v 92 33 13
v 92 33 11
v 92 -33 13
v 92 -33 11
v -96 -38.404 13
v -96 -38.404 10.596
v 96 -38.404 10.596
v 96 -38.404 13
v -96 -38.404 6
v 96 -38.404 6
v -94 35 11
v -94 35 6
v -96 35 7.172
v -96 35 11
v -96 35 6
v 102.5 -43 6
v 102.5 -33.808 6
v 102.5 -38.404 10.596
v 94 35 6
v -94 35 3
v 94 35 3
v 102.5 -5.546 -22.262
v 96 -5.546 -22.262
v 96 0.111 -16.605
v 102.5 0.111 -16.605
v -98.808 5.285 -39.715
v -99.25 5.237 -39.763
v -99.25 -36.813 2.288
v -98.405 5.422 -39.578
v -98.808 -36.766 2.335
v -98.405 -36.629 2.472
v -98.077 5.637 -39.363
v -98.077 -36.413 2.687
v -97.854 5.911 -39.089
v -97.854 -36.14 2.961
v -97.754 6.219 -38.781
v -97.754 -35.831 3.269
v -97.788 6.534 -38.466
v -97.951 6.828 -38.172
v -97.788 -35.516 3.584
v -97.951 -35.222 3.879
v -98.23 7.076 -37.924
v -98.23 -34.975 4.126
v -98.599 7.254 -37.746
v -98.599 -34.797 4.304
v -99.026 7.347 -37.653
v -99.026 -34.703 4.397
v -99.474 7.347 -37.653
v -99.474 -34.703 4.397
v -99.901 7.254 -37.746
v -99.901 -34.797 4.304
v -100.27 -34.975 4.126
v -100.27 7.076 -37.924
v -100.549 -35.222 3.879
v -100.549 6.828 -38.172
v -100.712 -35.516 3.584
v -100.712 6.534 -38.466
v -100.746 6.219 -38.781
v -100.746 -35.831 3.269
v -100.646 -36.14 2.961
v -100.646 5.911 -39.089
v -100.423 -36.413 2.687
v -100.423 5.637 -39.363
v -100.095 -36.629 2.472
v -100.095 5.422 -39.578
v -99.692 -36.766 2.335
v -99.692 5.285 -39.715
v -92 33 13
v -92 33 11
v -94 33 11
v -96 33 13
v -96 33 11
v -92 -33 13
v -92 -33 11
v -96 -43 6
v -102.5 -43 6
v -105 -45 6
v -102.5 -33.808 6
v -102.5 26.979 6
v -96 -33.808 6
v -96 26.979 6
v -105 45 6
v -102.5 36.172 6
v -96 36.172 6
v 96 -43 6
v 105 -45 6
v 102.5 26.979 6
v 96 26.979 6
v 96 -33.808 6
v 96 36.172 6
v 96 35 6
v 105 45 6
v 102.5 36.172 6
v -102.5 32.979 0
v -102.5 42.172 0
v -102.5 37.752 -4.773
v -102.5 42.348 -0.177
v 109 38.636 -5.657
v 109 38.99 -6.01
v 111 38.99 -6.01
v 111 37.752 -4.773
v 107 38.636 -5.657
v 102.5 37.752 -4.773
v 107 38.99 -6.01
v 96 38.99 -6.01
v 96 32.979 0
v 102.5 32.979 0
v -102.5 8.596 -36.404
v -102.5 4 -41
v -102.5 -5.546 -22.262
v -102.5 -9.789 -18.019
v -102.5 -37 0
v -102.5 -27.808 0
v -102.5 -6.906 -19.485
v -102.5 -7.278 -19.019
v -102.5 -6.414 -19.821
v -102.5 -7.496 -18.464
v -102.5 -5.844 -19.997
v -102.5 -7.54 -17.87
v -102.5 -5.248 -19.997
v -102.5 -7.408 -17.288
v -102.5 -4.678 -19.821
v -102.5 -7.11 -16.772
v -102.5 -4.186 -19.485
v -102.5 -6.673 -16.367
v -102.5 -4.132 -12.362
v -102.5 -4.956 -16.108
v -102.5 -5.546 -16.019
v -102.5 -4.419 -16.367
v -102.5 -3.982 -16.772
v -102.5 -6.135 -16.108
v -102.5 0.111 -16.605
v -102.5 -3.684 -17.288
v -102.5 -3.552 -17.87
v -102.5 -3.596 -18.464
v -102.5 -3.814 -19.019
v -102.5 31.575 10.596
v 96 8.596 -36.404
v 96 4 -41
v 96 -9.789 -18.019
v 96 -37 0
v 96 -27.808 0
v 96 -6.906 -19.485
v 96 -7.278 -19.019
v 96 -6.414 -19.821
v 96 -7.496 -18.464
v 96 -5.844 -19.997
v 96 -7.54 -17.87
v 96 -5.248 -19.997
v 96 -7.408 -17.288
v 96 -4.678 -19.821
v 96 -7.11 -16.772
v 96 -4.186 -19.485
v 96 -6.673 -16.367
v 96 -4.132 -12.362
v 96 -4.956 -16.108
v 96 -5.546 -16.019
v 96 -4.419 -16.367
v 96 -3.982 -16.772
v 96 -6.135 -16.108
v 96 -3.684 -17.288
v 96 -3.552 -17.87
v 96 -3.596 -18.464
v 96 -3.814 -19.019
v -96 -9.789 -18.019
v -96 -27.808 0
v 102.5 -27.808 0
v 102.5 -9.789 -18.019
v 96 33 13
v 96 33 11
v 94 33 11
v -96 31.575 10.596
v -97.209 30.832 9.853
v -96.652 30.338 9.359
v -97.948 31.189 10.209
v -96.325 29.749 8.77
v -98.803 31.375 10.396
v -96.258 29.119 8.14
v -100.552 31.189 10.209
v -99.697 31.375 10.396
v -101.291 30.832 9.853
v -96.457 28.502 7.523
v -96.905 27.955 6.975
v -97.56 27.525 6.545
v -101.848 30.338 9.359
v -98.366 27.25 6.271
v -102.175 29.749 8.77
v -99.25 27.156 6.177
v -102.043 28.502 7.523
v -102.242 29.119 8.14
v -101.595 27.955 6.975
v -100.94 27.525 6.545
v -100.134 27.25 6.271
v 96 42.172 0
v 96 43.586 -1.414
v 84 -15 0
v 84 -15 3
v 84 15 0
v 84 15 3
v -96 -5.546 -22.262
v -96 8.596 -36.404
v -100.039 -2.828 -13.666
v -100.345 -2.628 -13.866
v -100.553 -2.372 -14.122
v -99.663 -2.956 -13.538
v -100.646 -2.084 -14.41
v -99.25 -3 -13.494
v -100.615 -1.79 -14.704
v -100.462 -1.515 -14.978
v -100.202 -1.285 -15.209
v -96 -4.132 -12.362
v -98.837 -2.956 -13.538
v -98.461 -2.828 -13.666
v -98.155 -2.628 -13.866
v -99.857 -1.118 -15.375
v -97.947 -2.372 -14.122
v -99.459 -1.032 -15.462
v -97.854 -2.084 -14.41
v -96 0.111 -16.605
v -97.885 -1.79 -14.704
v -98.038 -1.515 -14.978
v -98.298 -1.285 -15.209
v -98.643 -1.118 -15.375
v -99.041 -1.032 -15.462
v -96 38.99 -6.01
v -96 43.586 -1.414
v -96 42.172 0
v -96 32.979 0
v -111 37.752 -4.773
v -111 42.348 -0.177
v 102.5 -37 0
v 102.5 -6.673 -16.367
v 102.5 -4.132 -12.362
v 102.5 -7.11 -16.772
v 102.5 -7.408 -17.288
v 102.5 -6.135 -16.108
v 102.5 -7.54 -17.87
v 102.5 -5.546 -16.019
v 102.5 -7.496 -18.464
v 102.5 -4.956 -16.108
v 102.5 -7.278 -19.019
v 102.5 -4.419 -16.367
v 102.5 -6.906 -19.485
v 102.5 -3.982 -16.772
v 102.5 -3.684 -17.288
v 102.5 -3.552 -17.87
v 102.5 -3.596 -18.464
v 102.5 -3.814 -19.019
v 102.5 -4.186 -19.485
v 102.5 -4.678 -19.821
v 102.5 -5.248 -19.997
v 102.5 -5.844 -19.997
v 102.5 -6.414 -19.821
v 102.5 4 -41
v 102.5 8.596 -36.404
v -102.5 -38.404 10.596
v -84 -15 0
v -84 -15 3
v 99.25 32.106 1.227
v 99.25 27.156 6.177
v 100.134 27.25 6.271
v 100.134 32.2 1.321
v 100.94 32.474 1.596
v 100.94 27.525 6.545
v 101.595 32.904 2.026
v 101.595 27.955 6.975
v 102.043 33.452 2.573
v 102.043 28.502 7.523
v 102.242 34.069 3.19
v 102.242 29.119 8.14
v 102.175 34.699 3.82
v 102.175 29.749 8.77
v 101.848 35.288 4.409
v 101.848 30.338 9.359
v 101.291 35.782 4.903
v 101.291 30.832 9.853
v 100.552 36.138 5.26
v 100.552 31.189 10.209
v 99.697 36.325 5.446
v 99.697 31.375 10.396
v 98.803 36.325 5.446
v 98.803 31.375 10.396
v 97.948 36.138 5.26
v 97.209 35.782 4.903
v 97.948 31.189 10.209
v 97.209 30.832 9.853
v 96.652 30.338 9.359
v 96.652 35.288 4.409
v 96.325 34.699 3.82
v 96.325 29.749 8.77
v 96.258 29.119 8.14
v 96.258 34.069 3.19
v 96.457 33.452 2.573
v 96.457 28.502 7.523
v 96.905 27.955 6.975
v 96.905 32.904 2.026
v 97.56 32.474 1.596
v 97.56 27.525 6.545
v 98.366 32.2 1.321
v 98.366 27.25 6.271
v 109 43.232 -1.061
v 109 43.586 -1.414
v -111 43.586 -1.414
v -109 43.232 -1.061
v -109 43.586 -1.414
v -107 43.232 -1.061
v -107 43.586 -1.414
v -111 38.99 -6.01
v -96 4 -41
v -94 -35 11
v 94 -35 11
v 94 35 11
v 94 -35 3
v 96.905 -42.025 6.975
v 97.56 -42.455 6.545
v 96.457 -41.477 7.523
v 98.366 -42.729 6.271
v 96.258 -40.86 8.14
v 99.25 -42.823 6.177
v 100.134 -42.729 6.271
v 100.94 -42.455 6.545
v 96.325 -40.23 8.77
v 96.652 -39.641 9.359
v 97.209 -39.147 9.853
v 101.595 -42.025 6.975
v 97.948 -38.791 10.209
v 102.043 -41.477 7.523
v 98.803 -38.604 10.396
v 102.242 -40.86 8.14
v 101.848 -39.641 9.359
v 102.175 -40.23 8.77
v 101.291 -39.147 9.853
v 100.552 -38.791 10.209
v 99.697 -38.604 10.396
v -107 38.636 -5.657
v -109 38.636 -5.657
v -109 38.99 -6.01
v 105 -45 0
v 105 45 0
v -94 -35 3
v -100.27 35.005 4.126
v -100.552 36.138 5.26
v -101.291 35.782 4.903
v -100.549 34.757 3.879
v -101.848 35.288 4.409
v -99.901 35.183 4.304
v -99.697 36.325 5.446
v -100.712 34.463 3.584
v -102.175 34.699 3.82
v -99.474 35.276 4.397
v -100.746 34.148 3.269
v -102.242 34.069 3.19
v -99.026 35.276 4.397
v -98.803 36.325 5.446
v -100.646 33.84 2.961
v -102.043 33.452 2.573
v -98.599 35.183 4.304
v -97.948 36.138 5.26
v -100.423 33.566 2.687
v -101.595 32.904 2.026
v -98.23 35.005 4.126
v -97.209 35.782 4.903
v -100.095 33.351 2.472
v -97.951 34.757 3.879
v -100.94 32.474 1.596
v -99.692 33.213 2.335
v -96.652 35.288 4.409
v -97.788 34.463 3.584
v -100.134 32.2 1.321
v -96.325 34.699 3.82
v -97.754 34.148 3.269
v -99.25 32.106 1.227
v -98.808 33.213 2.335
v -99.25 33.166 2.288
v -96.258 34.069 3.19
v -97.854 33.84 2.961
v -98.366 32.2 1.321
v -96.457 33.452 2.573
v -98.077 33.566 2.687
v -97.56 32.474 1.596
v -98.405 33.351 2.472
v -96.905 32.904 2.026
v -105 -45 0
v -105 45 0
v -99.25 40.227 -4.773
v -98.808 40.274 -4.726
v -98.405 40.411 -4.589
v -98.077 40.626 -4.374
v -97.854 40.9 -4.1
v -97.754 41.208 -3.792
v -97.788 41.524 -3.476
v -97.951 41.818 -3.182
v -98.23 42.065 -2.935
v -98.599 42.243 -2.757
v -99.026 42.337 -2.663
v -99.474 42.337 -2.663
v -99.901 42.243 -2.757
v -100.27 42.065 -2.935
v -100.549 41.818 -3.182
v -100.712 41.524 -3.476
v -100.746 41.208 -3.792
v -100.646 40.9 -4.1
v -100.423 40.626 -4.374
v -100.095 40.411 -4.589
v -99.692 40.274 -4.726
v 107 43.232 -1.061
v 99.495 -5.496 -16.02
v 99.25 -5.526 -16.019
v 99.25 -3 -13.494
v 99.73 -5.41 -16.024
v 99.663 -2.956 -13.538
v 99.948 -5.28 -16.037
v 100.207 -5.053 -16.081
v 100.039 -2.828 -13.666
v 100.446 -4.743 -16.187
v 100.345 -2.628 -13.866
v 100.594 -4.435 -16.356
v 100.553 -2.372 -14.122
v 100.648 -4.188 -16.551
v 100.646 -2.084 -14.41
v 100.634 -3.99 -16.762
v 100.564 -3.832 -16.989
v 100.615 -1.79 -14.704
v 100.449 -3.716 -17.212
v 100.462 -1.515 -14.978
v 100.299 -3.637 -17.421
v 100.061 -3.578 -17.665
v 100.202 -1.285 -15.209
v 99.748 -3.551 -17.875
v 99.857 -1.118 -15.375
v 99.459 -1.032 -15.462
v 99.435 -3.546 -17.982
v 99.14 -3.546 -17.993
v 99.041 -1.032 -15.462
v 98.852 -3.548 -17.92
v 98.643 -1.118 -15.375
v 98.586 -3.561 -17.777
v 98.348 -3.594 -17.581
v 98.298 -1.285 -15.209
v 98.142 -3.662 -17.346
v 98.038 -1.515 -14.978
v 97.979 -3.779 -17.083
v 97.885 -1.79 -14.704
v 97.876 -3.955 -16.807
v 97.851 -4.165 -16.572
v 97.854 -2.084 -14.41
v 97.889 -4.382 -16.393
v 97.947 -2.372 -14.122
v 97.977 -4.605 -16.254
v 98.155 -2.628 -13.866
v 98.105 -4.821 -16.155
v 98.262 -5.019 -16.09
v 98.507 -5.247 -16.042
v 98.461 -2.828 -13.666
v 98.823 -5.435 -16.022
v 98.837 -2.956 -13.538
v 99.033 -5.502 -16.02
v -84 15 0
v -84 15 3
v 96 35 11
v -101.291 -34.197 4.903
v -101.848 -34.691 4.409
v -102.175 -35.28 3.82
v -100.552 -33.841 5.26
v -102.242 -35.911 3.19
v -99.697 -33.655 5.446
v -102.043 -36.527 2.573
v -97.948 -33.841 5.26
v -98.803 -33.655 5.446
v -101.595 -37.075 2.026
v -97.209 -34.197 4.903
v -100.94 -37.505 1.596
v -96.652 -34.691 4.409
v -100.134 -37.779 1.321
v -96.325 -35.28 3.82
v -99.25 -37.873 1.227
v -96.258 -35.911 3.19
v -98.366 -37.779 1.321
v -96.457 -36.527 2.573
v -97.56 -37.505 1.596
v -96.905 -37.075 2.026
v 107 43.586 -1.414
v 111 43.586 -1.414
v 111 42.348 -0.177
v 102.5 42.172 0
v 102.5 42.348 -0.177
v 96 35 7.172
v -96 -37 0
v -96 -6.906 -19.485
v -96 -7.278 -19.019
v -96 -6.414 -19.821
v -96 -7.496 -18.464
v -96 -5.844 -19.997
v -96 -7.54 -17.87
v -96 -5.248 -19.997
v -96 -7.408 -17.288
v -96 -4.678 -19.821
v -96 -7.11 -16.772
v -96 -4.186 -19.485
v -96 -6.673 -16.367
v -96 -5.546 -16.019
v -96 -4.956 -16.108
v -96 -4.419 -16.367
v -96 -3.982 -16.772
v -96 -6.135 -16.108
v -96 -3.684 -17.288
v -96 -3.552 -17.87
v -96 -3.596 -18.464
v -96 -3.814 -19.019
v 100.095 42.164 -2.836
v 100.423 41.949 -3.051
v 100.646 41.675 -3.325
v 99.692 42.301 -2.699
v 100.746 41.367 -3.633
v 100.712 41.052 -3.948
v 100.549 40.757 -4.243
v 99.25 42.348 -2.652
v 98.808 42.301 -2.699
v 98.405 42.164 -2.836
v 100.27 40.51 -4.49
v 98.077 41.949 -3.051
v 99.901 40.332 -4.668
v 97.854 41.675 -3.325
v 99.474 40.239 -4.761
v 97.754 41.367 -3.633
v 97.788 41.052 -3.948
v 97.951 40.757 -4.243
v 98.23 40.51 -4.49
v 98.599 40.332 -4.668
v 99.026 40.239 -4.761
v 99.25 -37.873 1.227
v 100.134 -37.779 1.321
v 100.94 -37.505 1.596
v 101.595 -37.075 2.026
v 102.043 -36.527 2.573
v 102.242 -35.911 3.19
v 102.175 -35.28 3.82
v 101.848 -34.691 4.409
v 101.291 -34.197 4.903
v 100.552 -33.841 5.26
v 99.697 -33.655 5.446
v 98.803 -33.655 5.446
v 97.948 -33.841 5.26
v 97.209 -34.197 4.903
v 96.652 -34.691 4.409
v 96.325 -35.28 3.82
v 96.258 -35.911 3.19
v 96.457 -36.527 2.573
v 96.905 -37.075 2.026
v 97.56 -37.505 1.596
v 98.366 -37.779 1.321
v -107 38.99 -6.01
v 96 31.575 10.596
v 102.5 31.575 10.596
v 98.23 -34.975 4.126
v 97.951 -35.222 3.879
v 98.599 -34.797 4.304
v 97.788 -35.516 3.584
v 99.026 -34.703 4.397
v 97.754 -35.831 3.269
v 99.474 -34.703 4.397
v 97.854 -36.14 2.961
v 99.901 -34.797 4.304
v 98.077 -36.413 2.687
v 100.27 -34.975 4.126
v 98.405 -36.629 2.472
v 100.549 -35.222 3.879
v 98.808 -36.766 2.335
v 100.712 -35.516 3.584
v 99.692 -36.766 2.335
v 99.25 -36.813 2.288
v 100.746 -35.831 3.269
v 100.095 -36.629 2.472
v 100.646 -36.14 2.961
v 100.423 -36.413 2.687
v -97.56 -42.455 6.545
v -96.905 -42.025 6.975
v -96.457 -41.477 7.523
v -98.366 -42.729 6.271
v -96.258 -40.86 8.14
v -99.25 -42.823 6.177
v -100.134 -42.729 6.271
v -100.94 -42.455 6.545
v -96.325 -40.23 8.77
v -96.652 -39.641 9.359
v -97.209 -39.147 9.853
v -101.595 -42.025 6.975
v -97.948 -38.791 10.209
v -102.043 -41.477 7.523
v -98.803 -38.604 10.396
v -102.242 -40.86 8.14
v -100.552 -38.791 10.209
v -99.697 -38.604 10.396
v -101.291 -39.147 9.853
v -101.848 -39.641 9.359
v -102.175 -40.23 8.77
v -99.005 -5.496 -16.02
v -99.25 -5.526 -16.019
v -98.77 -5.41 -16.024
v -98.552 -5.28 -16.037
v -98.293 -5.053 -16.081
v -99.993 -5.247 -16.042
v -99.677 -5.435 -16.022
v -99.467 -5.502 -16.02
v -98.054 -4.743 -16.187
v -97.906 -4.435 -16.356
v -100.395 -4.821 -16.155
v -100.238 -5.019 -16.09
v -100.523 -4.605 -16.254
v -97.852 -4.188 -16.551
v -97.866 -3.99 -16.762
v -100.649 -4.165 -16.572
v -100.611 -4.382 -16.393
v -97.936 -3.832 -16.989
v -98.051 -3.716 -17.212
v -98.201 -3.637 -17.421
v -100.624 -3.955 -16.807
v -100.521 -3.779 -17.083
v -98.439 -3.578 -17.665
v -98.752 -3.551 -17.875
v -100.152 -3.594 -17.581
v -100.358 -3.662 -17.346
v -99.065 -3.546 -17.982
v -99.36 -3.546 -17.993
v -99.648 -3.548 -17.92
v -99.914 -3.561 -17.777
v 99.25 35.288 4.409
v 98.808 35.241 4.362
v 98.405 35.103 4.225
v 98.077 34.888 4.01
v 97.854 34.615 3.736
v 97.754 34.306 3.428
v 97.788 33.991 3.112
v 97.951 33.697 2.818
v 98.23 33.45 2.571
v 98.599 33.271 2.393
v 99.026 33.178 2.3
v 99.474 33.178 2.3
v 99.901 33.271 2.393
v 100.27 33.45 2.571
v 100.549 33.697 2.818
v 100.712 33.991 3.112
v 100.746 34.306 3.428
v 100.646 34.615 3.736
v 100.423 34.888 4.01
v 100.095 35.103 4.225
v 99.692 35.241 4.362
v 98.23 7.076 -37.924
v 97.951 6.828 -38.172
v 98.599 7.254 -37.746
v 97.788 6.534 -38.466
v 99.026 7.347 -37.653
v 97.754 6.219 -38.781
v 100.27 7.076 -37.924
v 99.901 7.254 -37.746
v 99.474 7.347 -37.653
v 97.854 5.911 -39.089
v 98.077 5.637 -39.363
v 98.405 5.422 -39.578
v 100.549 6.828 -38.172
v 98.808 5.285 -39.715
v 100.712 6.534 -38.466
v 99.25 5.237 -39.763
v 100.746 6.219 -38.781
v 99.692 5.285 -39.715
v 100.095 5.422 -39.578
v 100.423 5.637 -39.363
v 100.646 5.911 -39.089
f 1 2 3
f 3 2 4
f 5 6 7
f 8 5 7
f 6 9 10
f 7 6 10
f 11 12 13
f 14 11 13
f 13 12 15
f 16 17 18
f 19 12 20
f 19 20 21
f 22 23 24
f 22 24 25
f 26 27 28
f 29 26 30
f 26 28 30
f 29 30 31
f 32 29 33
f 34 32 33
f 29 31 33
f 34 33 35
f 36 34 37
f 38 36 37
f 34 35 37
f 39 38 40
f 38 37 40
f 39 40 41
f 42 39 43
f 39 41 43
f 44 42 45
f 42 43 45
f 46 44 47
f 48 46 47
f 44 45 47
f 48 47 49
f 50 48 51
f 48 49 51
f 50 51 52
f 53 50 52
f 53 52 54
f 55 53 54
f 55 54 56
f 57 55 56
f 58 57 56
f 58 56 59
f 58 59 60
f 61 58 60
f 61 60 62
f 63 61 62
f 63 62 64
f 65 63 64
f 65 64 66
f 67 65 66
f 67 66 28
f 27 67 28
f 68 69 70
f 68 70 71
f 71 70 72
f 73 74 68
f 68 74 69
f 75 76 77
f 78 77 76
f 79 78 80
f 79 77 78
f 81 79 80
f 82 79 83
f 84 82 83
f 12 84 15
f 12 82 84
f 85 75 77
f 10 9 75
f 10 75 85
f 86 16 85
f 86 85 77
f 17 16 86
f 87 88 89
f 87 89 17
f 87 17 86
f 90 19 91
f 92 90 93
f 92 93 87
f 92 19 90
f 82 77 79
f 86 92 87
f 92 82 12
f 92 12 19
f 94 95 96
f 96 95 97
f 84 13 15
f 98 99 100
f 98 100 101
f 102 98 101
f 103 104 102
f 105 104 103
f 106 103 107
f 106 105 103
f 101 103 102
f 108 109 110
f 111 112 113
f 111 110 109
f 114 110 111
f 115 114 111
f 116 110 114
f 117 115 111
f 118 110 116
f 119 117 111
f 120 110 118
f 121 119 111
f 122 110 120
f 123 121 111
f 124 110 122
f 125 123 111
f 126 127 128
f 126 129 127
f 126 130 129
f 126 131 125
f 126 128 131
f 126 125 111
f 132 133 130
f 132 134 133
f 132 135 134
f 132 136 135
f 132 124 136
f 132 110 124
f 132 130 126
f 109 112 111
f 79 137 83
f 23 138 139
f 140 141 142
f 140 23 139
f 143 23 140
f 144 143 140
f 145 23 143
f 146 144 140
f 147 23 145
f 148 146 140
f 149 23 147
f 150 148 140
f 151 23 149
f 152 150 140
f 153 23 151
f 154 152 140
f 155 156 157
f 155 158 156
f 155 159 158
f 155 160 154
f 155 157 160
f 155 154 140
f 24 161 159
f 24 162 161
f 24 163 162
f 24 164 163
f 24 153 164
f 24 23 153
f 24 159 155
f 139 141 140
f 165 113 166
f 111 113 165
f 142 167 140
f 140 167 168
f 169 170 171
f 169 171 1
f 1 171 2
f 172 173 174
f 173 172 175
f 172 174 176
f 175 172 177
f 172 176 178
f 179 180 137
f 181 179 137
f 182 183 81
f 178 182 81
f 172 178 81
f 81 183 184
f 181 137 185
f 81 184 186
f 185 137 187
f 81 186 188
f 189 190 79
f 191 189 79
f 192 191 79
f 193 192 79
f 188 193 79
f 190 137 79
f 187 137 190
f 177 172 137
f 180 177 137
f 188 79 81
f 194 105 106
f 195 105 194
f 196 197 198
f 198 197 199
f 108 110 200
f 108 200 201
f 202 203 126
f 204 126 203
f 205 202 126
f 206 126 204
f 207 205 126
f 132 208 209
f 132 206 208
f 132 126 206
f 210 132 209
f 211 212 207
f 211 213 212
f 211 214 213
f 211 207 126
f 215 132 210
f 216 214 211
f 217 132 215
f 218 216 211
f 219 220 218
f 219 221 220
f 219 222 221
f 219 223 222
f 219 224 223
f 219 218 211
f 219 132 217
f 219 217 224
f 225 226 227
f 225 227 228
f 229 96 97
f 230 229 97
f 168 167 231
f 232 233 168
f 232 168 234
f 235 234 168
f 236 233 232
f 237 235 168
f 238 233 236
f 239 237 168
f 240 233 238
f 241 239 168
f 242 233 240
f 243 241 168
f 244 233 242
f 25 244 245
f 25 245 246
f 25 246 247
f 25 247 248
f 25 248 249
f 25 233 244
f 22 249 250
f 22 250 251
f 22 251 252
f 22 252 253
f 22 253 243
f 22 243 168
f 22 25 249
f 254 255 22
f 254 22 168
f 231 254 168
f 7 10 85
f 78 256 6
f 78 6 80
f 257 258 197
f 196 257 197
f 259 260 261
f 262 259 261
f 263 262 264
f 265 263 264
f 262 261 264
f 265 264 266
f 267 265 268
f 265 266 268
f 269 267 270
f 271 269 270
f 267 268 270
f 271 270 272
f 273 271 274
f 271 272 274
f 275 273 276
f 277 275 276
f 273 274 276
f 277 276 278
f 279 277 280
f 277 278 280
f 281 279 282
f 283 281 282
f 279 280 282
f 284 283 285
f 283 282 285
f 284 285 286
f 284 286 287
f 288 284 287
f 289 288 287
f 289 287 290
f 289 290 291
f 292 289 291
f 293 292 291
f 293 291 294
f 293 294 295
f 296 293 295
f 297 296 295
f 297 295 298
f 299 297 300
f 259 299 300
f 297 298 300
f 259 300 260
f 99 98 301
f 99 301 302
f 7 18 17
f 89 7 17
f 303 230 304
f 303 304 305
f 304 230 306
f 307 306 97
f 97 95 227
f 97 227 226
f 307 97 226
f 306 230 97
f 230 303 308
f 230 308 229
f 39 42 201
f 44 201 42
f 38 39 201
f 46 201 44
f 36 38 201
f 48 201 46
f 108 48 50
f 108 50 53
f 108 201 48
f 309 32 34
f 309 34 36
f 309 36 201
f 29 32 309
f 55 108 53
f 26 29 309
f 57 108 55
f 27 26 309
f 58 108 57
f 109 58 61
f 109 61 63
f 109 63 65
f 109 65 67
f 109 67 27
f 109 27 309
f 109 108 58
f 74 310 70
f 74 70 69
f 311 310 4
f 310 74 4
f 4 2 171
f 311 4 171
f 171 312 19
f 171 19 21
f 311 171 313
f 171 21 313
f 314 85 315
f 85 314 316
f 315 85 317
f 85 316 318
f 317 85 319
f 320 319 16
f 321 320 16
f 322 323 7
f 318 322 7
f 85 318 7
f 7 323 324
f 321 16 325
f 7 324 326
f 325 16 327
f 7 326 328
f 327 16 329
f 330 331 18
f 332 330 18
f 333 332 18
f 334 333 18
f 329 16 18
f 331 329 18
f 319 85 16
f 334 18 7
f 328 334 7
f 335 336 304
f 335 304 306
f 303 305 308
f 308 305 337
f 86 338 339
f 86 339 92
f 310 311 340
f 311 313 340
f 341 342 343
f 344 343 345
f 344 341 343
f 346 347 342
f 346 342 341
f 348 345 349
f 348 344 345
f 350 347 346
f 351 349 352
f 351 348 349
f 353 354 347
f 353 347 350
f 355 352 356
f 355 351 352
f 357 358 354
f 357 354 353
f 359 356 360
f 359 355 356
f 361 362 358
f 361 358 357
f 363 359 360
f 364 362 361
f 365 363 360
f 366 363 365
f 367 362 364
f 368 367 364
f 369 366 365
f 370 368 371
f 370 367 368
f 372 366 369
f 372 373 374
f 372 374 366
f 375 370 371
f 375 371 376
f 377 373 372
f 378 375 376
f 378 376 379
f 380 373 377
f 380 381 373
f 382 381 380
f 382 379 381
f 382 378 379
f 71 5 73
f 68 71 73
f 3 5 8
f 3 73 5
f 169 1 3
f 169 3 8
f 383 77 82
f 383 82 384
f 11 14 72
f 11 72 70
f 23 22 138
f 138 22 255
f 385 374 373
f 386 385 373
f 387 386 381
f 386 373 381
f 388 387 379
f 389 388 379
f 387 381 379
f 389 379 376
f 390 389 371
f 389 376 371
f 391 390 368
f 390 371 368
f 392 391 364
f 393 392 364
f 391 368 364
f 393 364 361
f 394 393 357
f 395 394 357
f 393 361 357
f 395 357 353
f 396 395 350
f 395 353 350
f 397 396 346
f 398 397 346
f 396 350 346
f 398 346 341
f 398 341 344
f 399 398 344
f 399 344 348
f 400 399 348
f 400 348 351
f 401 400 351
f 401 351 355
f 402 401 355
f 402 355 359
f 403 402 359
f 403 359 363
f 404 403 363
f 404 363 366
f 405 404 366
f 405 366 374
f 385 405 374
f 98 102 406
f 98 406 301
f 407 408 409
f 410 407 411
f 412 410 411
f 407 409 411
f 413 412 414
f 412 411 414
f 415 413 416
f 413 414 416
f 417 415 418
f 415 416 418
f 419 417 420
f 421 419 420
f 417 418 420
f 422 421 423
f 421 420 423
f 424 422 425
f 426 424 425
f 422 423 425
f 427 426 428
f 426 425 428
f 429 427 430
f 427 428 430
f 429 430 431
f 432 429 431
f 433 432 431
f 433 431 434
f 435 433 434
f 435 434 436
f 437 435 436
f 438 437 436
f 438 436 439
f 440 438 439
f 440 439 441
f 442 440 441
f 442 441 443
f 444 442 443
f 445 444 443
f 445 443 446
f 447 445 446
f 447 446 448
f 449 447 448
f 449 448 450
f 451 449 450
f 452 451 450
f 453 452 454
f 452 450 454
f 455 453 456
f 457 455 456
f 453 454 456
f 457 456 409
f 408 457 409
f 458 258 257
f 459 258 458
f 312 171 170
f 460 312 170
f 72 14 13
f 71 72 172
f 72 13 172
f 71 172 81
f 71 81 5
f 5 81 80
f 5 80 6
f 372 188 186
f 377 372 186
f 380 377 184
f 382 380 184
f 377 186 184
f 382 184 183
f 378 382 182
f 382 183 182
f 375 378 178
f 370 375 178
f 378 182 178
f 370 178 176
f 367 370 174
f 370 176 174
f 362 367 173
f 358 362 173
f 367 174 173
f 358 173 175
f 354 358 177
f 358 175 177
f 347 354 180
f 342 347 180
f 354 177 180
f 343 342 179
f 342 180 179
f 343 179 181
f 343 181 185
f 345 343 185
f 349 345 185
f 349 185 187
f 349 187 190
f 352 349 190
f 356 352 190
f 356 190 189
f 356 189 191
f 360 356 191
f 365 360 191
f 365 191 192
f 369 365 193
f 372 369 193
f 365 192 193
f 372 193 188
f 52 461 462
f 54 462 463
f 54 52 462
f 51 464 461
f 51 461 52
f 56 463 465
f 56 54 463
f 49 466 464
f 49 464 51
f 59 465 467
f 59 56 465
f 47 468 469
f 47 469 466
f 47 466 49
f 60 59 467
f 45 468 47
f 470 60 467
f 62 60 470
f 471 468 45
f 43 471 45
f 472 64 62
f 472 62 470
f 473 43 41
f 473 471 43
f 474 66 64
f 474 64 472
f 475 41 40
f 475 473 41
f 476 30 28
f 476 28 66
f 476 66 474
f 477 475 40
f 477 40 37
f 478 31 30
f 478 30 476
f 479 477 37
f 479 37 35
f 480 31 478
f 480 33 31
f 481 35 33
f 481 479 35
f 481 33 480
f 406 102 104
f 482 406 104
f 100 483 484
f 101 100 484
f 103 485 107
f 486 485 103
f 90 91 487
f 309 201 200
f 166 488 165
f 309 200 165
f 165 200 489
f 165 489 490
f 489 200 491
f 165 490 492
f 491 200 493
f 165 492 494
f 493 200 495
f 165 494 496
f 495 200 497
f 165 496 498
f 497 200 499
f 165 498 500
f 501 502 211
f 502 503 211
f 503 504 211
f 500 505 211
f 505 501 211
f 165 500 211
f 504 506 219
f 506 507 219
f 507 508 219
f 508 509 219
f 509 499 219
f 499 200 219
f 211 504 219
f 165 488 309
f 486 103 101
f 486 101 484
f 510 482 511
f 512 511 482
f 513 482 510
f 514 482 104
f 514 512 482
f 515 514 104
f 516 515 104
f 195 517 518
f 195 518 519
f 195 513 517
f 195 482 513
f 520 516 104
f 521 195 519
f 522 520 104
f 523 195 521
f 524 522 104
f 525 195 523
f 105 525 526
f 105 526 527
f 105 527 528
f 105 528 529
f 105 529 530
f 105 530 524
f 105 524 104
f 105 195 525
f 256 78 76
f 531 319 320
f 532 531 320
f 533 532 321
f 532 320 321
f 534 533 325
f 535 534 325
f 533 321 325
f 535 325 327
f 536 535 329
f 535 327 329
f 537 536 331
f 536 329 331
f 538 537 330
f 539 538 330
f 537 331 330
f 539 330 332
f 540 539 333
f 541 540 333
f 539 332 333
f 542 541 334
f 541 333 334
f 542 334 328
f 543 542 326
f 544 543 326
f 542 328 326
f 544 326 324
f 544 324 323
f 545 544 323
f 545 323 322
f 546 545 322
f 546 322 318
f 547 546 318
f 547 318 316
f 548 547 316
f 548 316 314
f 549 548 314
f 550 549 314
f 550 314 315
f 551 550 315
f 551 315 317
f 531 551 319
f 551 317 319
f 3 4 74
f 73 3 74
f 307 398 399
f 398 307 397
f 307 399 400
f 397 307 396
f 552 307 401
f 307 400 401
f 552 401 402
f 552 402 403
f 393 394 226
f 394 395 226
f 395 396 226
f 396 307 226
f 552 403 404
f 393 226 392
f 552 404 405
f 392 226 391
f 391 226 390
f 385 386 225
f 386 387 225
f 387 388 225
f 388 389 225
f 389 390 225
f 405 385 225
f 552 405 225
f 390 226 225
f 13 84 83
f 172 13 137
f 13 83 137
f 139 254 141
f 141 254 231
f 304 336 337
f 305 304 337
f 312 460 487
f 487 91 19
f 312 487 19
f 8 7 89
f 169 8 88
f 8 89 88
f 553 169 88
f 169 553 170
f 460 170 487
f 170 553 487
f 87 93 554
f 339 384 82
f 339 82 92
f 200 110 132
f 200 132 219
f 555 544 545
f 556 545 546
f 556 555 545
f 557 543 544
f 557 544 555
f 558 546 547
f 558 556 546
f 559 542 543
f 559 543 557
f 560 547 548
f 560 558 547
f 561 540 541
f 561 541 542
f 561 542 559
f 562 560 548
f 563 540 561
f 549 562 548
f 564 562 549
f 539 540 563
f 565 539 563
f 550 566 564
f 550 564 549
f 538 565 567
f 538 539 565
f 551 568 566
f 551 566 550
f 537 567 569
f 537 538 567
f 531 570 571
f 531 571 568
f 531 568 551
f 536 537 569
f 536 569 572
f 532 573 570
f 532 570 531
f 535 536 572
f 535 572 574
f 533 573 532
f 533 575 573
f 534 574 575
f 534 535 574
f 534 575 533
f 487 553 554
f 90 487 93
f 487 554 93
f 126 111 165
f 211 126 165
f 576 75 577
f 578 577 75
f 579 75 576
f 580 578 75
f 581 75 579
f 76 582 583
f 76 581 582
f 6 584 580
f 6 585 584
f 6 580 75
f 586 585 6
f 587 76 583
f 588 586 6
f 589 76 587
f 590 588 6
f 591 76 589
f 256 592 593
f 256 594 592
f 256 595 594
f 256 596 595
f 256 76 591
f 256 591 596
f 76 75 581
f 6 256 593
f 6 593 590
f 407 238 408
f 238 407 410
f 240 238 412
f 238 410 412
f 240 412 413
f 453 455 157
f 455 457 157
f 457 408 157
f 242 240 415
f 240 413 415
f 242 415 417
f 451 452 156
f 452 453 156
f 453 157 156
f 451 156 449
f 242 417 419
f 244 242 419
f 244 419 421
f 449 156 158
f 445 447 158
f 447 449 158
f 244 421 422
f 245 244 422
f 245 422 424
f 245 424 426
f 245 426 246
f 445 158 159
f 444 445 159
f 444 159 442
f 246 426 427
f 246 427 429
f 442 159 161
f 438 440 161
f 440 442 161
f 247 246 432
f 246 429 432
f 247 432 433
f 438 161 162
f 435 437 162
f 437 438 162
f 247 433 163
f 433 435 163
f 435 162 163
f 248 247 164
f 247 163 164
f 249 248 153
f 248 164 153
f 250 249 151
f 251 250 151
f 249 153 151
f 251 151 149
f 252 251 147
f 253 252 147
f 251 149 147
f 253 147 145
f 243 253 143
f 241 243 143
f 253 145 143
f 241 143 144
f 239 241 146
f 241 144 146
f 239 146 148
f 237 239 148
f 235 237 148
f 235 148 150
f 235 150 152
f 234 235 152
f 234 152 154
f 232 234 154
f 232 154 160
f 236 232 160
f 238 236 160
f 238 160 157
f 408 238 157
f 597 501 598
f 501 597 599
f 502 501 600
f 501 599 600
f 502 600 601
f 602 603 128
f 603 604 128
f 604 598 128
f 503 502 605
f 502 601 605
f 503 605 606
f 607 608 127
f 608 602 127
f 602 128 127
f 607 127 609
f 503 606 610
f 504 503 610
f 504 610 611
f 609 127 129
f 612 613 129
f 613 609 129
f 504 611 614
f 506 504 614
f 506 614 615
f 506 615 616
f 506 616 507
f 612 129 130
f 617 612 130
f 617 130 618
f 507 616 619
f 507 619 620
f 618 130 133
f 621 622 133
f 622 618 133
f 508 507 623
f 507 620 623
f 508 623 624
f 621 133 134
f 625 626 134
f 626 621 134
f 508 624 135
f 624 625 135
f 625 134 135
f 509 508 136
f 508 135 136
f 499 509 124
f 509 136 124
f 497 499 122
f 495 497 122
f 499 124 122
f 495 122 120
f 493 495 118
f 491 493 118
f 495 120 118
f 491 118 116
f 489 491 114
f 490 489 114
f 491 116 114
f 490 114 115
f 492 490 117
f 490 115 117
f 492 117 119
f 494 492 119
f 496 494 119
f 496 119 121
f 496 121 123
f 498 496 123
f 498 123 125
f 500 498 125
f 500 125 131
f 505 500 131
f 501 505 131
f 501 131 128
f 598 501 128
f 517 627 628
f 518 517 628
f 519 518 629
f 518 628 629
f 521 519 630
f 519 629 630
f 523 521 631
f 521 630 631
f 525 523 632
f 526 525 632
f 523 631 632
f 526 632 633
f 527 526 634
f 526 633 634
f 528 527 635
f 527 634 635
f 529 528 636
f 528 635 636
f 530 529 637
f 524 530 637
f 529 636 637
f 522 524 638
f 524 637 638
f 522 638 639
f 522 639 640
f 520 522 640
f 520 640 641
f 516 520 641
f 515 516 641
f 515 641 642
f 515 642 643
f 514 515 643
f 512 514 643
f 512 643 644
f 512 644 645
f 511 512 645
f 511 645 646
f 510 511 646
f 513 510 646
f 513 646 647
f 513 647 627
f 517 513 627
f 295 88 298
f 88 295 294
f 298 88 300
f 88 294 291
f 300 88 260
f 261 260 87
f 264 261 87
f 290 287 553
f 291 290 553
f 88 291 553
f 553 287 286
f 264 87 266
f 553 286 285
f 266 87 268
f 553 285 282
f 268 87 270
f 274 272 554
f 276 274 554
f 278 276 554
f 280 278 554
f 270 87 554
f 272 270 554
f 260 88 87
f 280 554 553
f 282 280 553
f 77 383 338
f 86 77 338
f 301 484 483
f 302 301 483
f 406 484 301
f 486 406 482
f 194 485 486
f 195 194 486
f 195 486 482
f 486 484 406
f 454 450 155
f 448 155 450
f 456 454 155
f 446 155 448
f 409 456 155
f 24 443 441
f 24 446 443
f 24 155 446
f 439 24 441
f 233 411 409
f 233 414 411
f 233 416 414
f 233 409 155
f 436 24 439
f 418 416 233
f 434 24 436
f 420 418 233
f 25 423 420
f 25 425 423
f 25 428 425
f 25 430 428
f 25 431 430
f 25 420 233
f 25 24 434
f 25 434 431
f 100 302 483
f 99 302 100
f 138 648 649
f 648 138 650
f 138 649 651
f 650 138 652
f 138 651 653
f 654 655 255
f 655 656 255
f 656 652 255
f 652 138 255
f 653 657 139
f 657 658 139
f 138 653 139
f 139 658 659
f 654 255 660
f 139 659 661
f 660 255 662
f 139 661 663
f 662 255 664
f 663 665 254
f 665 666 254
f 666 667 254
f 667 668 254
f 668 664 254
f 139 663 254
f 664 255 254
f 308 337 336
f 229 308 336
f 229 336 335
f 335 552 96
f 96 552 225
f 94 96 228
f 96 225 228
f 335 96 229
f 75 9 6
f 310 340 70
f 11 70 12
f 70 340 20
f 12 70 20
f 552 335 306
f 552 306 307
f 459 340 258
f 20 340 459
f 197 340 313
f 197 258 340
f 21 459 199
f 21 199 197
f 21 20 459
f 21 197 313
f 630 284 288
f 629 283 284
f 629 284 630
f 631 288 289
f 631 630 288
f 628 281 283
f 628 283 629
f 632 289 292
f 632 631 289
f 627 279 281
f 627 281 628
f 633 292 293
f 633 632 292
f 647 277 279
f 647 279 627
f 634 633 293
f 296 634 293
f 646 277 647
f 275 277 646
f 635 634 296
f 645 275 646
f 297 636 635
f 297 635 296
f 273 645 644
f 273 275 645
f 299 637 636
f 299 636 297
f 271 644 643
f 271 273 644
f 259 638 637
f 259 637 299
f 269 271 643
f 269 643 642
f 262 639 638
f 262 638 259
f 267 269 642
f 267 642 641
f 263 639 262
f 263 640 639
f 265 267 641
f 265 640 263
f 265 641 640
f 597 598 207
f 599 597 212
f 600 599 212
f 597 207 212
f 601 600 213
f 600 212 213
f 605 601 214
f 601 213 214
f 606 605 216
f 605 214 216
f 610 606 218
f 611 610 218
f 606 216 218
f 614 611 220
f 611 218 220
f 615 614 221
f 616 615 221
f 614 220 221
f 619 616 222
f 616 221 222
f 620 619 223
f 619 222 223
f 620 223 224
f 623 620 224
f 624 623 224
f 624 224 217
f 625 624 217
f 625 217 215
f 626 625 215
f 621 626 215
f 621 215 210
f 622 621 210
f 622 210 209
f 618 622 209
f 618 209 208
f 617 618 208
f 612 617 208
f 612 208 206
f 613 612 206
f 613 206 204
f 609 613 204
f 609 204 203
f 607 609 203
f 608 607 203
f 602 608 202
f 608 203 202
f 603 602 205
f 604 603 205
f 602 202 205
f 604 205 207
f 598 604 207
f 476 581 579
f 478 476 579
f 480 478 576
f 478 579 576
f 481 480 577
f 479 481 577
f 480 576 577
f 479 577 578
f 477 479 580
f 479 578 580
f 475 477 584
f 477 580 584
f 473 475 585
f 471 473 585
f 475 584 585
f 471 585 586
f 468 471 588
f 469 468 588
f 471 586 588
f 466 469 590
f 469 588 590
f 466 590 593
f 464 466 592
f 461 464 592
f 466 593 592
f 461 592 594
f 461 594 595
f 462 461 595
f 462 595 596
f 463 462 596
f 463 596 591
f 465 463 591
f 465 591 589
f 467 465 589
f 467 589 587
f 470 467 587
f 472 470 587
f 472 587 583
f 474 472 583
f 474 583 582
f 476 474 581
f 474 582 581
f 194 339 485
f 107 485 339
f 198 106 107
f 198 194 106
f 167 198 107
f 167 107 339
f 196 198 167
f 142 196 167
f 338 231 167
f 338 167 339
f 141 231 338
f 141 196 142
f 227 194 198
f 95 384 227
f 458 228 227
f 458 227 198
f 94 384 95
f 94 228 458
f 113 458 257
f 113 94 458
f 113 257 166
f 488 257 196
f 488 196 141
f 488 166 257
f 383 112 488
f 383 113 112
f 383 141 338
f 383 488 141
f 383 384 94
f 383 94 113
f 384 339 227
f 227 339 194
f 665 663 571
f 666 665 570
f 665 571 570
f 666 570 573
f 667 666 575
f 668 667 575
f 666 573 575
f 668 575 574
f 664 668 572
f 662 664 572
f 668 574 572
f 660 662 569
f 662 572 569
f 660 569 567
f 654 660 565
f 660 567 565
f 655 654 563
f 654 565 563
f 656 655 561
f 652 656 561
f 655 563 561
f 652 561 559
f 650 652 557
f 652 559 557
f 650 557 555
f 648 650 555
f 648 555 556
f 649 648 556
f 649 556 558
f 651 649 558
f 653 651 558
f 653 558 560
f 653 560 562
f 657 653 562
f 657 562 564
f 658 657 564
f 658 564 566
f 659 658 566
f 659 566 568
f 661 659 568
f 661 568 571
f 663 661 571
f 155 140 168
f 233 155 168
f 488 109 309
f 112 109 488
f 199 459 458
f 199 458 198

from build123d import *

# Parameters (mm, degrees)
SKETCH2_W                       = 210
SKETCH2_H                       = 90
BOSS_EXTRUDE1_DEPTH             = 6
SKETCH3_W                       = 188
SKETCH3_H                       = 70
CUT_EXTRUDE1_DEPTH              = 3
CUT_EXTRUDE2_REACH              = 116.276
SKETCH4_W                       = 168
SKETCH4_H                       = 30
BOSS_EXTRUDE2_DEPTH             = 9
CUT_EXTRUDE3_DEPTH              = 2.5
SKETCH9_R                       = 3
CUT_EXTRUDE5_DEPTH              = 7
CUT_EXTRUDE7_DEPTH              = 2.5
CUT_EXTRUDE9_REACH              = 125.918
SKETCH14_R                      = 1.5
SKETCH15_R                      = 3
CUT_EXTRUDE10_DEPTH             = 7
CUT_EXTRUDE12_REACH             = 139.325
SKETCH17_R                      = 1.5
BOSS_EXTRUDE3_DEPTH             = 9
SKETCH19_R                      = 3
CUT_EXTRUDE13_DEPTH             = 7
SKETCH20_R                      = 3
CUT_EXTRUDE14_DEPTH             = 7
CUT_EXTRUDE15_DEPTH             = 2.5
CUT_EXTRUDE16_REACH             = 125.918
SKETCH22_R                      = 1.5
CUT_EXTRUDE16_DIRECTION_2_DEPTH = 124.918371619
CUT_EXTRUDE17_REACH             = 139.325
SKETCH23_R                      = 1.5
CUT_EXTRUDE18_DEPTH             = 2.5
SKETCH25_W                      = 6.5
SKETCH25_H                      = 6
BOSS_EXTRUDE4_DEPTH             = 8
SKETCH26_R                      = 1.4
CUT_EXTRUDE19_DEPTH             = 4
SKETCH27_R                      = 2
CUT_EXTRUDE20_DEPTH             = 217.245809208
BOSS_EXTRUDE6_DEPTH             = 8.5
CUT_EXTRUDE21_REACH             = 145.328
SKETCH29_W                      = 2
SKETCH29_H                      = 0.5
BOSS_EXTRUDE7_DEPTH             = 8.5
CUT_EXTRUDE22_REACH             = 145.328
SKETCH31_W                      = 2
SKETCH31_H                      = 0.5
BOSS_EXTRUDE8_DEPTH             = 5
BOSS_EXTRUDE9_DEPTH             = 2


with BuildPart() as part:
    # Sketch2 → Boss-Extrude1 (new body)
    with BuildSketch(Plane.XY):
        Rectangle(SKETCH2_W, SKETCH2_H)
    extrude(amount=BOSS_EXTRUDE1_DEPTH)

    # Sketch3 → Cut-Extrude1 (cut)
    with BuildSketch(Plane.XY.offset(6)):
        Rectangle(SKETCH3_W, SKETCH3_H)
    extrude(amount=-CUT_EXTRUDE1_DEPTH, mode=Mode.SUBTRACT)

    # Sketch4 → Cut-Extrude2 (cut, up to next)
    with BuildSketch(Plane.XY.offset(3), mode=Mode.PRIVATE) as cut_extrude2_sk1:
        Rectangle(SKETCH4_W, SKETCH4_H)
    cut_extrude2_tool1 = extrude(cut_extrude2_sk1.sketch, amount=-CUT_EXTRUDE2_REACH, mode=Mode.PRIVATE) & part.part
    add(cut_extrude2_tool1.solids().sort_by_distance((0, 0, 3))[0], mode=Mode.SUBTRACT)

    # Sketch7 → Boss-Extrude2 (add)
    with BuildSketch(Plane.ZY.offset(105)):
        Polygon((-6.01040764, 38.98959236), (-1.414213562, 43.585786438), (10.596194078, 31.575378798), (6, 26.97918472), align=None)
        Polygon((-41, 4), (6, -43), (10.596194078, -38.403805922), (-36.403805922, 8.596194078), align=None)
    extrude(amount=-BOSS_EXTRUDE2_DEPTH)

    # Sketch8 → Cut-Extrude3 (cut)
    with BuildSketch(Plane.ZY.offset(105)):
        Polygon((6, 36.171572875), (10.596194078, 31.575378798), (6, 26.97918472), align=None)
        Polygon((6, -33.807611845), (6, -43), (10.596194078, -38.403805922), align=None)
    extrude(amount=-CUT_EXTRUDE3_DEPTH, mode=Mode.SUBTRACT)

    # Sketch9 → Cut-Extrude5 (cut)
    with BuildSketch(Plane(origin=(0, 10.48959236, -10.48959236), x_dir=(1, 0, 0), z_dir=(0, -0.7071067811865437, 0.7071067811865515))):
        with Locations(Location((-99.25, 26.569805153, 0), (0, 0, 270))):
            Circle(SKETCH9_R)
    extrude(amount=-CUT_EXTRUDE5_DEPTH, mode=Mode.SUBTRACT)

    # Sketch11 → Cut-Extrude7 (cut)
    with BuildSketch(Plane.ZY.offset(105)):
        Polygon((-1.414213562, 43.585786438), (0, 42.171572875), (0, 32.97918472), (-6.01040764, 38.98959236), align=None)
        Polygon((-36.403805922, 8.596194078), (-41, 4), (0, -37), (0, -27.807611845), align=None)
    extrude(amount=-CUT_EXTRUDE7_DEPTH, mode=Mode.SUBTRACT)

    # Sketch14 → Cut-Extrude9 (cut, up to next)
    with BuildSketch(Plane(origin=(0, 15.439339828, -15.439339828), x_dir=(1, 0, 0), z_dir=(0, -0.7071067811865437, 0.7071067811865515)), mode=Mode.PRIVATE) as cut_extrude9_sk1:
        with Locations(Location((-99.25, 26.569805153, 0), (0, 0, 270))):
            Circle(SKETCH14_R)
    cut_extrude9_tool1 = extrude(cut_extrude9_sk1.sketch, amount=-CUT_EXTRUDE9_REACH, mode=Mode.PRIVATE) & part.part
    add(cut_extrude9_tool1.solids().sort_by_distance((-99.25, 34.227029, 3.34835))[0], mode=Mode.SUBTRACT)

    # Sketch15 → Cut-Extrude10 (cut)
    with BuildSketch(Plane(origin=(0, -24.5, 24.5), x_dir=(1, 0, 0), z_dir=(0, -0.707106781186551, 0.7071067811865441))):
        with Locations(Location((-99.25, -22.912950904, 0), (0, 0, 270))):
            Circle(SKETCH15_R)
    extrude(amount=-CUT_EXTRUDE10_DEPTH, mode=Mode.SUBTRACT)

    # Sketch17 → Cut-Extrude12 (cut, up to next)
    with BuildSketch(Plane(origin=(0, -19.550252532, 19.550252532), x_dir=(1, 0, 0), z_dir=(0, -0.7071067811865509, 0.7071067811865442)), mode=Mode.PRIVATE) as cut_extrude12_sk1:
        with Locations(Location((-99.25, -22.912950904, 0), (0, 0, 270))):
            Circle(SKETCH17_R)
    cut_extrude12_tool1 = extrude(cut_extrude12_sk1.sketch, amount=-CUT_EXTRUDE12_REACH, mode=Mode.PRIVATE) & part.part
    add(cut_extrude12_tool1.solids().sort_by_distance((-99.25, -35.752155, 3.34835))[0], mode=Mode.SUBTRACT)

    # Sketch18 → Boss-Extrude3 (add)
    with BuildSketch(Plane(origin=(105, 0, 0), x_dir=(0, 0, -1), z_dir=(1, 0, 0))):
        Polygon((-10.596194078, 31.575378798), (1.414213562, 43.585786438), (6.01040764, 38.98959236), (-6, 26.97918472), align=None)
        Polygon((-10.596194078, -38.403805922), (36.403805922, 8.596194078), (41, 4), (-6, -43), align=None)
    extrude(amount=-BOSS_EXTRUDE3_DEPTH)

    # Sketch19 → Cut-Extrude13 (cut)
    with BuildSketch(Plane(origin=(0, 10.48959236, -10.48959236), x_dir=(1, 0, 0), z_dir=(0, -0.7071067811865444, 0.7071067811865508))):
        with Locations(Location((99.25, 26.569805153, 0), (0, 0, 270))):
            Circle(SKETCH19_R)
    extrude(amount=-CUT_EXTRUDE13_DEPTH, mode=Mode.SUBTRACT)

    # Sketch20 → Cut-Extrude14 (cut)
    with BuildSketch(Plane(origin=(0, -24.5, 24.5), x_dir=(1, 0, 0), z_dir=(0, -0.707106781186551, 0.7071067811865441))):
        with Locations(Location((99.25, -22.912950904, 0), (0, 0, 270))):
            Circle(SKETCH20_R)
    extrude(amount=-CUT_EXTRUDE14_DEPTH, mode=Mode.SUBTRACT)

    # Sketch21 → Cut-Extrude15 (cut)
    with BuildSketch(Plane(origin=(105, 0, 0), x_dir=(0, 0, -1), z_dir=(1, 0, 0))):
        Polygon((-10.596194078, -38.403805922), (-6, -33.807611845), (-6, -43), align=None)
        Polygon((-6, 36.171572875), (-6, 26.97918472), (-10.596194078, 31.575378798), align=None)
    extrude(amount=-CUT_EXTRUDE15_DEPTH, mode=Mode.SUBTRACT)

    # Sketch22 → Cut-Extrude16 (cut, up to next)
    with BuildSketch(Plane(origin=(0, 15.439339828, -15.439339828), x_dir=(1, 0, 0), z_dir=(0, -0.7071067811865445, 0.7071067811865507)), mode=Mode.PRIVATE) as cut_extrude16_sk1:
        with Locations(Location((99.25, 26.569805153, 0), (0, 0, 90))):
            Circle(SKETCH22_R)
    cut_extrude16_tool1 = extrude(cut_extrude16_sk1.sketch, amount=-CUT_EXTRUDE16_REACH, mode=Mode.PRIVATE) & part.part
    add(cut_extrude16_tool1.solids().sort_by_distance((99.25, 34.227029, 3.34835))[0], mode=Mode.SUBTRACT)

    # Sketch22 → Cut-Extrude16 direction 2 (cut)
    with BuildSketch(Plane(origin=(0, 15.439339828, -15.439339828), x_dir=(1, 0, 0), z_dir=(0, -0.7071067811865445, 0.7071067811865507))):
        with Locations(Location((99.25, 26.569805153, 0), (0, 0, 90))):
            Circle(SKETCH22_R)
    extrude(amount=CUT_EXTRUDE16_DIRECTION_2_DEPTH, mode=Mode.SUBTRACT)

    # Sketch23 → Cut-Extrude17 (cut, up to next)
    with BuildSketch(Plane(origin=(0, -19.550252532, 19.550252532), x_dir=(1, 0, 0), z_dir=(0, -0.7071067811865509, 0.7071067811865442)), mode=Mode.PRIVATE) as cut_extrude17_sk1:
        with Locations(Location((99.25, -22.912950904, 0), (0, 0, 270))):
            Circle(SKETCH23_R)
    cut_extrude17_tool1 = extrude(cut_extrude17_sk1.sketch, amount=-CUT_EXTRUDE17_REACH, mode=Mode.PRIVATE) & part.part
    add(cut_extrude17_tool1.solids().sort_by_distance((99.25, -35.752155, 3.34835))[0], mode=Mode.SUBTRACT)

    # Sketch24 → Cut-Extrude18 (cut)
    with BuildSketch(Plane(origin=(105, 0, 0), x_dir=(0, 0, -1), z_dir=(1, 0, 0))):
        Polygon((1.414213562, 43.585786438), (0, 42.171572875), (0, 32.97918472), (6.01040764, 38.98959236), align=None)
        Polygon((0, -27.807611845), (0, -37), (41, 4), (36.403805922, 8.596194078), align=None)
    extrude(amount=-CUT_EXTRUDE18_DEPTH, mode=Mode.SUBTRACT)

    # Sketch25 → Boss-Extrude4 (add)
    with BuildSketch(Plane(origin=(0, -13.903805922, -13.903805922), x_dir=(1, 0, 0), z_dir=(0, 0.7071067811865439, 0.7071067811865511))):
        with Locations((-99.25, 8.819805153)):
            Rectangle(SKETCH25_W, SKETCH25_H)
        with Locations((99.25, 8.819805153)):
            Rectangle(SKETCH25_W, SKETCH25_H)
    extrude(amount=BOSS_EXTRUDE4_DEPTH)

    # Sketch26 → Cut-Extrude19 (cut)
    with BuildSketch(Plane(origin=(0, -8.246951673, -8.246951673), x_dir=(1, 0, 0), z_dir=(0, 0.7071067811865438, 0.7071067811865512))):
        with Locations(Location((99.25, 8.819805153, 0), (0, 0, 270))):
            Circle(SKETCH26_R)
        with Locations(Location((-99.25, 8.819805153, 0), (0, 0, 270))):
            Circle(SKETCH26_R)
    extrude(amount=-CUT_EXTRUDE19_DEPTH, mode=Mode.SUBTRACT)

    # Sketch27 → Cut-Extrude20 (cut, through all)
    with BuildSketch(Plane.ZY.offset(102.5)):
        with Locations((-18.019029611, -5.545941546)):
            Circle(SKETCH27_R)
    extrude(amount=-CUT_EXTRUDE20_DEPTH, mode=Mode.SUBTRACT)

    # Sketch28 → Boss-Extrude6 (add)
    with BuildSketch(Plane(origin=(102.5, 0, 0), x_dir=(0, 0, -1), z_dir=(1, 0, 0))):
        Polygon((1.414213562, 43.585786438), (6.01040764, 38.98959236), (4.772970773, 37.752155493), (0.176776695, 42.348349571), align=None)
    extrude(amount=BOSS_EXTRUDE6_DEPTH)

    # Sketch29 → Cut-Extrude21 (cut, up to next)
    with BuildSketch(Plane(origin=(0, 21.085786438, 21.085786438), x_dir=(1, 0, 0), z_dir=(0, 0.7071067811865506, 0.7071067811865446)), mode=Mode.PRIVATE) as cut_extrude21_sk1:
        with Locations((108, 31.569805153)):
            Rectangle(SKETCH29_W, SKETCH29_H)
    cut_extrude21_tool1 = extrude(cut_extrude21_sk1.sketch, amount=-CUT_EXTRUDE21_REACH, mode=Mode.PRIVATE) & part.part
    add(cut_extrude21_tool1.solids().sort_by_distance((108, 43.40901, -1.237437))[0], mode=Mode.SUBTRACT)

    # Sketch30 → Boss-Extrude7 (add)
    with BuildSketch(Plane.ZY.offset(102.5)):
        Polygon((-1.414213562, 43.585786438), (-6.01040764, 38.98959236), (-4.772970773, 37.752155493), (-0.176776695, 42.348349571), align=None)
    extrude(amount=BOSS_EXTRUDE7_DEPTH)

    # Sketch31 → Cut-Extrude22 (cut, up to next)
    with BuildSketch(Plane(origin=(0, 21.085786438, 21.085786438), x_dir=(1, 0, 0), z_dir=(0, 0.7071067811865506, 0.7071067811865446)), mode=Mode.PRIVATE) as cut_extrude22_sk1:
        with Locations((-108, 31.569805153)):
            Rectangle(SKETCH31_W, SKETCH31_H)
    cut_extrude22_tool1 = extrude(cut_extrude22_sk1.sketch, amount=-CUT_EXTRUDE22_REACH, mode=Mode.PRIVATE) & part.part
    add(cut_extrude22_tool1.solids().sort_by_distance((-108, 43.40901, -1.237437))[0], mode=Mode.SUBTRACT)

    # Sketch32 → Boss-Extrude8 (add)
    with BuildSketch(Plane.XY.offset(6)):
        Polygon((-96, -38.403805922), (96, -38.403805922), (96, 35), (94, 35), (94, -35), (-94, -35), (-94, 35), (-96, 35), align=None)
    extrude(amount=BOSS_EXTRUDE8_DEPTH)

    # Sketch33 → Boss-Extrude9 (add)
    with BuildSketch(Plane.XY.offset(11)):
        Polygon((-96, -38.403805922), (96, -38.403805922), (96, 33), (92, 33), (92, -33), (-92, -33), (-92, 33), (-96, 33), align=None)
    extrude(amount=BOSS_EXTRUDE9_DEPTH)


solid = part.part
